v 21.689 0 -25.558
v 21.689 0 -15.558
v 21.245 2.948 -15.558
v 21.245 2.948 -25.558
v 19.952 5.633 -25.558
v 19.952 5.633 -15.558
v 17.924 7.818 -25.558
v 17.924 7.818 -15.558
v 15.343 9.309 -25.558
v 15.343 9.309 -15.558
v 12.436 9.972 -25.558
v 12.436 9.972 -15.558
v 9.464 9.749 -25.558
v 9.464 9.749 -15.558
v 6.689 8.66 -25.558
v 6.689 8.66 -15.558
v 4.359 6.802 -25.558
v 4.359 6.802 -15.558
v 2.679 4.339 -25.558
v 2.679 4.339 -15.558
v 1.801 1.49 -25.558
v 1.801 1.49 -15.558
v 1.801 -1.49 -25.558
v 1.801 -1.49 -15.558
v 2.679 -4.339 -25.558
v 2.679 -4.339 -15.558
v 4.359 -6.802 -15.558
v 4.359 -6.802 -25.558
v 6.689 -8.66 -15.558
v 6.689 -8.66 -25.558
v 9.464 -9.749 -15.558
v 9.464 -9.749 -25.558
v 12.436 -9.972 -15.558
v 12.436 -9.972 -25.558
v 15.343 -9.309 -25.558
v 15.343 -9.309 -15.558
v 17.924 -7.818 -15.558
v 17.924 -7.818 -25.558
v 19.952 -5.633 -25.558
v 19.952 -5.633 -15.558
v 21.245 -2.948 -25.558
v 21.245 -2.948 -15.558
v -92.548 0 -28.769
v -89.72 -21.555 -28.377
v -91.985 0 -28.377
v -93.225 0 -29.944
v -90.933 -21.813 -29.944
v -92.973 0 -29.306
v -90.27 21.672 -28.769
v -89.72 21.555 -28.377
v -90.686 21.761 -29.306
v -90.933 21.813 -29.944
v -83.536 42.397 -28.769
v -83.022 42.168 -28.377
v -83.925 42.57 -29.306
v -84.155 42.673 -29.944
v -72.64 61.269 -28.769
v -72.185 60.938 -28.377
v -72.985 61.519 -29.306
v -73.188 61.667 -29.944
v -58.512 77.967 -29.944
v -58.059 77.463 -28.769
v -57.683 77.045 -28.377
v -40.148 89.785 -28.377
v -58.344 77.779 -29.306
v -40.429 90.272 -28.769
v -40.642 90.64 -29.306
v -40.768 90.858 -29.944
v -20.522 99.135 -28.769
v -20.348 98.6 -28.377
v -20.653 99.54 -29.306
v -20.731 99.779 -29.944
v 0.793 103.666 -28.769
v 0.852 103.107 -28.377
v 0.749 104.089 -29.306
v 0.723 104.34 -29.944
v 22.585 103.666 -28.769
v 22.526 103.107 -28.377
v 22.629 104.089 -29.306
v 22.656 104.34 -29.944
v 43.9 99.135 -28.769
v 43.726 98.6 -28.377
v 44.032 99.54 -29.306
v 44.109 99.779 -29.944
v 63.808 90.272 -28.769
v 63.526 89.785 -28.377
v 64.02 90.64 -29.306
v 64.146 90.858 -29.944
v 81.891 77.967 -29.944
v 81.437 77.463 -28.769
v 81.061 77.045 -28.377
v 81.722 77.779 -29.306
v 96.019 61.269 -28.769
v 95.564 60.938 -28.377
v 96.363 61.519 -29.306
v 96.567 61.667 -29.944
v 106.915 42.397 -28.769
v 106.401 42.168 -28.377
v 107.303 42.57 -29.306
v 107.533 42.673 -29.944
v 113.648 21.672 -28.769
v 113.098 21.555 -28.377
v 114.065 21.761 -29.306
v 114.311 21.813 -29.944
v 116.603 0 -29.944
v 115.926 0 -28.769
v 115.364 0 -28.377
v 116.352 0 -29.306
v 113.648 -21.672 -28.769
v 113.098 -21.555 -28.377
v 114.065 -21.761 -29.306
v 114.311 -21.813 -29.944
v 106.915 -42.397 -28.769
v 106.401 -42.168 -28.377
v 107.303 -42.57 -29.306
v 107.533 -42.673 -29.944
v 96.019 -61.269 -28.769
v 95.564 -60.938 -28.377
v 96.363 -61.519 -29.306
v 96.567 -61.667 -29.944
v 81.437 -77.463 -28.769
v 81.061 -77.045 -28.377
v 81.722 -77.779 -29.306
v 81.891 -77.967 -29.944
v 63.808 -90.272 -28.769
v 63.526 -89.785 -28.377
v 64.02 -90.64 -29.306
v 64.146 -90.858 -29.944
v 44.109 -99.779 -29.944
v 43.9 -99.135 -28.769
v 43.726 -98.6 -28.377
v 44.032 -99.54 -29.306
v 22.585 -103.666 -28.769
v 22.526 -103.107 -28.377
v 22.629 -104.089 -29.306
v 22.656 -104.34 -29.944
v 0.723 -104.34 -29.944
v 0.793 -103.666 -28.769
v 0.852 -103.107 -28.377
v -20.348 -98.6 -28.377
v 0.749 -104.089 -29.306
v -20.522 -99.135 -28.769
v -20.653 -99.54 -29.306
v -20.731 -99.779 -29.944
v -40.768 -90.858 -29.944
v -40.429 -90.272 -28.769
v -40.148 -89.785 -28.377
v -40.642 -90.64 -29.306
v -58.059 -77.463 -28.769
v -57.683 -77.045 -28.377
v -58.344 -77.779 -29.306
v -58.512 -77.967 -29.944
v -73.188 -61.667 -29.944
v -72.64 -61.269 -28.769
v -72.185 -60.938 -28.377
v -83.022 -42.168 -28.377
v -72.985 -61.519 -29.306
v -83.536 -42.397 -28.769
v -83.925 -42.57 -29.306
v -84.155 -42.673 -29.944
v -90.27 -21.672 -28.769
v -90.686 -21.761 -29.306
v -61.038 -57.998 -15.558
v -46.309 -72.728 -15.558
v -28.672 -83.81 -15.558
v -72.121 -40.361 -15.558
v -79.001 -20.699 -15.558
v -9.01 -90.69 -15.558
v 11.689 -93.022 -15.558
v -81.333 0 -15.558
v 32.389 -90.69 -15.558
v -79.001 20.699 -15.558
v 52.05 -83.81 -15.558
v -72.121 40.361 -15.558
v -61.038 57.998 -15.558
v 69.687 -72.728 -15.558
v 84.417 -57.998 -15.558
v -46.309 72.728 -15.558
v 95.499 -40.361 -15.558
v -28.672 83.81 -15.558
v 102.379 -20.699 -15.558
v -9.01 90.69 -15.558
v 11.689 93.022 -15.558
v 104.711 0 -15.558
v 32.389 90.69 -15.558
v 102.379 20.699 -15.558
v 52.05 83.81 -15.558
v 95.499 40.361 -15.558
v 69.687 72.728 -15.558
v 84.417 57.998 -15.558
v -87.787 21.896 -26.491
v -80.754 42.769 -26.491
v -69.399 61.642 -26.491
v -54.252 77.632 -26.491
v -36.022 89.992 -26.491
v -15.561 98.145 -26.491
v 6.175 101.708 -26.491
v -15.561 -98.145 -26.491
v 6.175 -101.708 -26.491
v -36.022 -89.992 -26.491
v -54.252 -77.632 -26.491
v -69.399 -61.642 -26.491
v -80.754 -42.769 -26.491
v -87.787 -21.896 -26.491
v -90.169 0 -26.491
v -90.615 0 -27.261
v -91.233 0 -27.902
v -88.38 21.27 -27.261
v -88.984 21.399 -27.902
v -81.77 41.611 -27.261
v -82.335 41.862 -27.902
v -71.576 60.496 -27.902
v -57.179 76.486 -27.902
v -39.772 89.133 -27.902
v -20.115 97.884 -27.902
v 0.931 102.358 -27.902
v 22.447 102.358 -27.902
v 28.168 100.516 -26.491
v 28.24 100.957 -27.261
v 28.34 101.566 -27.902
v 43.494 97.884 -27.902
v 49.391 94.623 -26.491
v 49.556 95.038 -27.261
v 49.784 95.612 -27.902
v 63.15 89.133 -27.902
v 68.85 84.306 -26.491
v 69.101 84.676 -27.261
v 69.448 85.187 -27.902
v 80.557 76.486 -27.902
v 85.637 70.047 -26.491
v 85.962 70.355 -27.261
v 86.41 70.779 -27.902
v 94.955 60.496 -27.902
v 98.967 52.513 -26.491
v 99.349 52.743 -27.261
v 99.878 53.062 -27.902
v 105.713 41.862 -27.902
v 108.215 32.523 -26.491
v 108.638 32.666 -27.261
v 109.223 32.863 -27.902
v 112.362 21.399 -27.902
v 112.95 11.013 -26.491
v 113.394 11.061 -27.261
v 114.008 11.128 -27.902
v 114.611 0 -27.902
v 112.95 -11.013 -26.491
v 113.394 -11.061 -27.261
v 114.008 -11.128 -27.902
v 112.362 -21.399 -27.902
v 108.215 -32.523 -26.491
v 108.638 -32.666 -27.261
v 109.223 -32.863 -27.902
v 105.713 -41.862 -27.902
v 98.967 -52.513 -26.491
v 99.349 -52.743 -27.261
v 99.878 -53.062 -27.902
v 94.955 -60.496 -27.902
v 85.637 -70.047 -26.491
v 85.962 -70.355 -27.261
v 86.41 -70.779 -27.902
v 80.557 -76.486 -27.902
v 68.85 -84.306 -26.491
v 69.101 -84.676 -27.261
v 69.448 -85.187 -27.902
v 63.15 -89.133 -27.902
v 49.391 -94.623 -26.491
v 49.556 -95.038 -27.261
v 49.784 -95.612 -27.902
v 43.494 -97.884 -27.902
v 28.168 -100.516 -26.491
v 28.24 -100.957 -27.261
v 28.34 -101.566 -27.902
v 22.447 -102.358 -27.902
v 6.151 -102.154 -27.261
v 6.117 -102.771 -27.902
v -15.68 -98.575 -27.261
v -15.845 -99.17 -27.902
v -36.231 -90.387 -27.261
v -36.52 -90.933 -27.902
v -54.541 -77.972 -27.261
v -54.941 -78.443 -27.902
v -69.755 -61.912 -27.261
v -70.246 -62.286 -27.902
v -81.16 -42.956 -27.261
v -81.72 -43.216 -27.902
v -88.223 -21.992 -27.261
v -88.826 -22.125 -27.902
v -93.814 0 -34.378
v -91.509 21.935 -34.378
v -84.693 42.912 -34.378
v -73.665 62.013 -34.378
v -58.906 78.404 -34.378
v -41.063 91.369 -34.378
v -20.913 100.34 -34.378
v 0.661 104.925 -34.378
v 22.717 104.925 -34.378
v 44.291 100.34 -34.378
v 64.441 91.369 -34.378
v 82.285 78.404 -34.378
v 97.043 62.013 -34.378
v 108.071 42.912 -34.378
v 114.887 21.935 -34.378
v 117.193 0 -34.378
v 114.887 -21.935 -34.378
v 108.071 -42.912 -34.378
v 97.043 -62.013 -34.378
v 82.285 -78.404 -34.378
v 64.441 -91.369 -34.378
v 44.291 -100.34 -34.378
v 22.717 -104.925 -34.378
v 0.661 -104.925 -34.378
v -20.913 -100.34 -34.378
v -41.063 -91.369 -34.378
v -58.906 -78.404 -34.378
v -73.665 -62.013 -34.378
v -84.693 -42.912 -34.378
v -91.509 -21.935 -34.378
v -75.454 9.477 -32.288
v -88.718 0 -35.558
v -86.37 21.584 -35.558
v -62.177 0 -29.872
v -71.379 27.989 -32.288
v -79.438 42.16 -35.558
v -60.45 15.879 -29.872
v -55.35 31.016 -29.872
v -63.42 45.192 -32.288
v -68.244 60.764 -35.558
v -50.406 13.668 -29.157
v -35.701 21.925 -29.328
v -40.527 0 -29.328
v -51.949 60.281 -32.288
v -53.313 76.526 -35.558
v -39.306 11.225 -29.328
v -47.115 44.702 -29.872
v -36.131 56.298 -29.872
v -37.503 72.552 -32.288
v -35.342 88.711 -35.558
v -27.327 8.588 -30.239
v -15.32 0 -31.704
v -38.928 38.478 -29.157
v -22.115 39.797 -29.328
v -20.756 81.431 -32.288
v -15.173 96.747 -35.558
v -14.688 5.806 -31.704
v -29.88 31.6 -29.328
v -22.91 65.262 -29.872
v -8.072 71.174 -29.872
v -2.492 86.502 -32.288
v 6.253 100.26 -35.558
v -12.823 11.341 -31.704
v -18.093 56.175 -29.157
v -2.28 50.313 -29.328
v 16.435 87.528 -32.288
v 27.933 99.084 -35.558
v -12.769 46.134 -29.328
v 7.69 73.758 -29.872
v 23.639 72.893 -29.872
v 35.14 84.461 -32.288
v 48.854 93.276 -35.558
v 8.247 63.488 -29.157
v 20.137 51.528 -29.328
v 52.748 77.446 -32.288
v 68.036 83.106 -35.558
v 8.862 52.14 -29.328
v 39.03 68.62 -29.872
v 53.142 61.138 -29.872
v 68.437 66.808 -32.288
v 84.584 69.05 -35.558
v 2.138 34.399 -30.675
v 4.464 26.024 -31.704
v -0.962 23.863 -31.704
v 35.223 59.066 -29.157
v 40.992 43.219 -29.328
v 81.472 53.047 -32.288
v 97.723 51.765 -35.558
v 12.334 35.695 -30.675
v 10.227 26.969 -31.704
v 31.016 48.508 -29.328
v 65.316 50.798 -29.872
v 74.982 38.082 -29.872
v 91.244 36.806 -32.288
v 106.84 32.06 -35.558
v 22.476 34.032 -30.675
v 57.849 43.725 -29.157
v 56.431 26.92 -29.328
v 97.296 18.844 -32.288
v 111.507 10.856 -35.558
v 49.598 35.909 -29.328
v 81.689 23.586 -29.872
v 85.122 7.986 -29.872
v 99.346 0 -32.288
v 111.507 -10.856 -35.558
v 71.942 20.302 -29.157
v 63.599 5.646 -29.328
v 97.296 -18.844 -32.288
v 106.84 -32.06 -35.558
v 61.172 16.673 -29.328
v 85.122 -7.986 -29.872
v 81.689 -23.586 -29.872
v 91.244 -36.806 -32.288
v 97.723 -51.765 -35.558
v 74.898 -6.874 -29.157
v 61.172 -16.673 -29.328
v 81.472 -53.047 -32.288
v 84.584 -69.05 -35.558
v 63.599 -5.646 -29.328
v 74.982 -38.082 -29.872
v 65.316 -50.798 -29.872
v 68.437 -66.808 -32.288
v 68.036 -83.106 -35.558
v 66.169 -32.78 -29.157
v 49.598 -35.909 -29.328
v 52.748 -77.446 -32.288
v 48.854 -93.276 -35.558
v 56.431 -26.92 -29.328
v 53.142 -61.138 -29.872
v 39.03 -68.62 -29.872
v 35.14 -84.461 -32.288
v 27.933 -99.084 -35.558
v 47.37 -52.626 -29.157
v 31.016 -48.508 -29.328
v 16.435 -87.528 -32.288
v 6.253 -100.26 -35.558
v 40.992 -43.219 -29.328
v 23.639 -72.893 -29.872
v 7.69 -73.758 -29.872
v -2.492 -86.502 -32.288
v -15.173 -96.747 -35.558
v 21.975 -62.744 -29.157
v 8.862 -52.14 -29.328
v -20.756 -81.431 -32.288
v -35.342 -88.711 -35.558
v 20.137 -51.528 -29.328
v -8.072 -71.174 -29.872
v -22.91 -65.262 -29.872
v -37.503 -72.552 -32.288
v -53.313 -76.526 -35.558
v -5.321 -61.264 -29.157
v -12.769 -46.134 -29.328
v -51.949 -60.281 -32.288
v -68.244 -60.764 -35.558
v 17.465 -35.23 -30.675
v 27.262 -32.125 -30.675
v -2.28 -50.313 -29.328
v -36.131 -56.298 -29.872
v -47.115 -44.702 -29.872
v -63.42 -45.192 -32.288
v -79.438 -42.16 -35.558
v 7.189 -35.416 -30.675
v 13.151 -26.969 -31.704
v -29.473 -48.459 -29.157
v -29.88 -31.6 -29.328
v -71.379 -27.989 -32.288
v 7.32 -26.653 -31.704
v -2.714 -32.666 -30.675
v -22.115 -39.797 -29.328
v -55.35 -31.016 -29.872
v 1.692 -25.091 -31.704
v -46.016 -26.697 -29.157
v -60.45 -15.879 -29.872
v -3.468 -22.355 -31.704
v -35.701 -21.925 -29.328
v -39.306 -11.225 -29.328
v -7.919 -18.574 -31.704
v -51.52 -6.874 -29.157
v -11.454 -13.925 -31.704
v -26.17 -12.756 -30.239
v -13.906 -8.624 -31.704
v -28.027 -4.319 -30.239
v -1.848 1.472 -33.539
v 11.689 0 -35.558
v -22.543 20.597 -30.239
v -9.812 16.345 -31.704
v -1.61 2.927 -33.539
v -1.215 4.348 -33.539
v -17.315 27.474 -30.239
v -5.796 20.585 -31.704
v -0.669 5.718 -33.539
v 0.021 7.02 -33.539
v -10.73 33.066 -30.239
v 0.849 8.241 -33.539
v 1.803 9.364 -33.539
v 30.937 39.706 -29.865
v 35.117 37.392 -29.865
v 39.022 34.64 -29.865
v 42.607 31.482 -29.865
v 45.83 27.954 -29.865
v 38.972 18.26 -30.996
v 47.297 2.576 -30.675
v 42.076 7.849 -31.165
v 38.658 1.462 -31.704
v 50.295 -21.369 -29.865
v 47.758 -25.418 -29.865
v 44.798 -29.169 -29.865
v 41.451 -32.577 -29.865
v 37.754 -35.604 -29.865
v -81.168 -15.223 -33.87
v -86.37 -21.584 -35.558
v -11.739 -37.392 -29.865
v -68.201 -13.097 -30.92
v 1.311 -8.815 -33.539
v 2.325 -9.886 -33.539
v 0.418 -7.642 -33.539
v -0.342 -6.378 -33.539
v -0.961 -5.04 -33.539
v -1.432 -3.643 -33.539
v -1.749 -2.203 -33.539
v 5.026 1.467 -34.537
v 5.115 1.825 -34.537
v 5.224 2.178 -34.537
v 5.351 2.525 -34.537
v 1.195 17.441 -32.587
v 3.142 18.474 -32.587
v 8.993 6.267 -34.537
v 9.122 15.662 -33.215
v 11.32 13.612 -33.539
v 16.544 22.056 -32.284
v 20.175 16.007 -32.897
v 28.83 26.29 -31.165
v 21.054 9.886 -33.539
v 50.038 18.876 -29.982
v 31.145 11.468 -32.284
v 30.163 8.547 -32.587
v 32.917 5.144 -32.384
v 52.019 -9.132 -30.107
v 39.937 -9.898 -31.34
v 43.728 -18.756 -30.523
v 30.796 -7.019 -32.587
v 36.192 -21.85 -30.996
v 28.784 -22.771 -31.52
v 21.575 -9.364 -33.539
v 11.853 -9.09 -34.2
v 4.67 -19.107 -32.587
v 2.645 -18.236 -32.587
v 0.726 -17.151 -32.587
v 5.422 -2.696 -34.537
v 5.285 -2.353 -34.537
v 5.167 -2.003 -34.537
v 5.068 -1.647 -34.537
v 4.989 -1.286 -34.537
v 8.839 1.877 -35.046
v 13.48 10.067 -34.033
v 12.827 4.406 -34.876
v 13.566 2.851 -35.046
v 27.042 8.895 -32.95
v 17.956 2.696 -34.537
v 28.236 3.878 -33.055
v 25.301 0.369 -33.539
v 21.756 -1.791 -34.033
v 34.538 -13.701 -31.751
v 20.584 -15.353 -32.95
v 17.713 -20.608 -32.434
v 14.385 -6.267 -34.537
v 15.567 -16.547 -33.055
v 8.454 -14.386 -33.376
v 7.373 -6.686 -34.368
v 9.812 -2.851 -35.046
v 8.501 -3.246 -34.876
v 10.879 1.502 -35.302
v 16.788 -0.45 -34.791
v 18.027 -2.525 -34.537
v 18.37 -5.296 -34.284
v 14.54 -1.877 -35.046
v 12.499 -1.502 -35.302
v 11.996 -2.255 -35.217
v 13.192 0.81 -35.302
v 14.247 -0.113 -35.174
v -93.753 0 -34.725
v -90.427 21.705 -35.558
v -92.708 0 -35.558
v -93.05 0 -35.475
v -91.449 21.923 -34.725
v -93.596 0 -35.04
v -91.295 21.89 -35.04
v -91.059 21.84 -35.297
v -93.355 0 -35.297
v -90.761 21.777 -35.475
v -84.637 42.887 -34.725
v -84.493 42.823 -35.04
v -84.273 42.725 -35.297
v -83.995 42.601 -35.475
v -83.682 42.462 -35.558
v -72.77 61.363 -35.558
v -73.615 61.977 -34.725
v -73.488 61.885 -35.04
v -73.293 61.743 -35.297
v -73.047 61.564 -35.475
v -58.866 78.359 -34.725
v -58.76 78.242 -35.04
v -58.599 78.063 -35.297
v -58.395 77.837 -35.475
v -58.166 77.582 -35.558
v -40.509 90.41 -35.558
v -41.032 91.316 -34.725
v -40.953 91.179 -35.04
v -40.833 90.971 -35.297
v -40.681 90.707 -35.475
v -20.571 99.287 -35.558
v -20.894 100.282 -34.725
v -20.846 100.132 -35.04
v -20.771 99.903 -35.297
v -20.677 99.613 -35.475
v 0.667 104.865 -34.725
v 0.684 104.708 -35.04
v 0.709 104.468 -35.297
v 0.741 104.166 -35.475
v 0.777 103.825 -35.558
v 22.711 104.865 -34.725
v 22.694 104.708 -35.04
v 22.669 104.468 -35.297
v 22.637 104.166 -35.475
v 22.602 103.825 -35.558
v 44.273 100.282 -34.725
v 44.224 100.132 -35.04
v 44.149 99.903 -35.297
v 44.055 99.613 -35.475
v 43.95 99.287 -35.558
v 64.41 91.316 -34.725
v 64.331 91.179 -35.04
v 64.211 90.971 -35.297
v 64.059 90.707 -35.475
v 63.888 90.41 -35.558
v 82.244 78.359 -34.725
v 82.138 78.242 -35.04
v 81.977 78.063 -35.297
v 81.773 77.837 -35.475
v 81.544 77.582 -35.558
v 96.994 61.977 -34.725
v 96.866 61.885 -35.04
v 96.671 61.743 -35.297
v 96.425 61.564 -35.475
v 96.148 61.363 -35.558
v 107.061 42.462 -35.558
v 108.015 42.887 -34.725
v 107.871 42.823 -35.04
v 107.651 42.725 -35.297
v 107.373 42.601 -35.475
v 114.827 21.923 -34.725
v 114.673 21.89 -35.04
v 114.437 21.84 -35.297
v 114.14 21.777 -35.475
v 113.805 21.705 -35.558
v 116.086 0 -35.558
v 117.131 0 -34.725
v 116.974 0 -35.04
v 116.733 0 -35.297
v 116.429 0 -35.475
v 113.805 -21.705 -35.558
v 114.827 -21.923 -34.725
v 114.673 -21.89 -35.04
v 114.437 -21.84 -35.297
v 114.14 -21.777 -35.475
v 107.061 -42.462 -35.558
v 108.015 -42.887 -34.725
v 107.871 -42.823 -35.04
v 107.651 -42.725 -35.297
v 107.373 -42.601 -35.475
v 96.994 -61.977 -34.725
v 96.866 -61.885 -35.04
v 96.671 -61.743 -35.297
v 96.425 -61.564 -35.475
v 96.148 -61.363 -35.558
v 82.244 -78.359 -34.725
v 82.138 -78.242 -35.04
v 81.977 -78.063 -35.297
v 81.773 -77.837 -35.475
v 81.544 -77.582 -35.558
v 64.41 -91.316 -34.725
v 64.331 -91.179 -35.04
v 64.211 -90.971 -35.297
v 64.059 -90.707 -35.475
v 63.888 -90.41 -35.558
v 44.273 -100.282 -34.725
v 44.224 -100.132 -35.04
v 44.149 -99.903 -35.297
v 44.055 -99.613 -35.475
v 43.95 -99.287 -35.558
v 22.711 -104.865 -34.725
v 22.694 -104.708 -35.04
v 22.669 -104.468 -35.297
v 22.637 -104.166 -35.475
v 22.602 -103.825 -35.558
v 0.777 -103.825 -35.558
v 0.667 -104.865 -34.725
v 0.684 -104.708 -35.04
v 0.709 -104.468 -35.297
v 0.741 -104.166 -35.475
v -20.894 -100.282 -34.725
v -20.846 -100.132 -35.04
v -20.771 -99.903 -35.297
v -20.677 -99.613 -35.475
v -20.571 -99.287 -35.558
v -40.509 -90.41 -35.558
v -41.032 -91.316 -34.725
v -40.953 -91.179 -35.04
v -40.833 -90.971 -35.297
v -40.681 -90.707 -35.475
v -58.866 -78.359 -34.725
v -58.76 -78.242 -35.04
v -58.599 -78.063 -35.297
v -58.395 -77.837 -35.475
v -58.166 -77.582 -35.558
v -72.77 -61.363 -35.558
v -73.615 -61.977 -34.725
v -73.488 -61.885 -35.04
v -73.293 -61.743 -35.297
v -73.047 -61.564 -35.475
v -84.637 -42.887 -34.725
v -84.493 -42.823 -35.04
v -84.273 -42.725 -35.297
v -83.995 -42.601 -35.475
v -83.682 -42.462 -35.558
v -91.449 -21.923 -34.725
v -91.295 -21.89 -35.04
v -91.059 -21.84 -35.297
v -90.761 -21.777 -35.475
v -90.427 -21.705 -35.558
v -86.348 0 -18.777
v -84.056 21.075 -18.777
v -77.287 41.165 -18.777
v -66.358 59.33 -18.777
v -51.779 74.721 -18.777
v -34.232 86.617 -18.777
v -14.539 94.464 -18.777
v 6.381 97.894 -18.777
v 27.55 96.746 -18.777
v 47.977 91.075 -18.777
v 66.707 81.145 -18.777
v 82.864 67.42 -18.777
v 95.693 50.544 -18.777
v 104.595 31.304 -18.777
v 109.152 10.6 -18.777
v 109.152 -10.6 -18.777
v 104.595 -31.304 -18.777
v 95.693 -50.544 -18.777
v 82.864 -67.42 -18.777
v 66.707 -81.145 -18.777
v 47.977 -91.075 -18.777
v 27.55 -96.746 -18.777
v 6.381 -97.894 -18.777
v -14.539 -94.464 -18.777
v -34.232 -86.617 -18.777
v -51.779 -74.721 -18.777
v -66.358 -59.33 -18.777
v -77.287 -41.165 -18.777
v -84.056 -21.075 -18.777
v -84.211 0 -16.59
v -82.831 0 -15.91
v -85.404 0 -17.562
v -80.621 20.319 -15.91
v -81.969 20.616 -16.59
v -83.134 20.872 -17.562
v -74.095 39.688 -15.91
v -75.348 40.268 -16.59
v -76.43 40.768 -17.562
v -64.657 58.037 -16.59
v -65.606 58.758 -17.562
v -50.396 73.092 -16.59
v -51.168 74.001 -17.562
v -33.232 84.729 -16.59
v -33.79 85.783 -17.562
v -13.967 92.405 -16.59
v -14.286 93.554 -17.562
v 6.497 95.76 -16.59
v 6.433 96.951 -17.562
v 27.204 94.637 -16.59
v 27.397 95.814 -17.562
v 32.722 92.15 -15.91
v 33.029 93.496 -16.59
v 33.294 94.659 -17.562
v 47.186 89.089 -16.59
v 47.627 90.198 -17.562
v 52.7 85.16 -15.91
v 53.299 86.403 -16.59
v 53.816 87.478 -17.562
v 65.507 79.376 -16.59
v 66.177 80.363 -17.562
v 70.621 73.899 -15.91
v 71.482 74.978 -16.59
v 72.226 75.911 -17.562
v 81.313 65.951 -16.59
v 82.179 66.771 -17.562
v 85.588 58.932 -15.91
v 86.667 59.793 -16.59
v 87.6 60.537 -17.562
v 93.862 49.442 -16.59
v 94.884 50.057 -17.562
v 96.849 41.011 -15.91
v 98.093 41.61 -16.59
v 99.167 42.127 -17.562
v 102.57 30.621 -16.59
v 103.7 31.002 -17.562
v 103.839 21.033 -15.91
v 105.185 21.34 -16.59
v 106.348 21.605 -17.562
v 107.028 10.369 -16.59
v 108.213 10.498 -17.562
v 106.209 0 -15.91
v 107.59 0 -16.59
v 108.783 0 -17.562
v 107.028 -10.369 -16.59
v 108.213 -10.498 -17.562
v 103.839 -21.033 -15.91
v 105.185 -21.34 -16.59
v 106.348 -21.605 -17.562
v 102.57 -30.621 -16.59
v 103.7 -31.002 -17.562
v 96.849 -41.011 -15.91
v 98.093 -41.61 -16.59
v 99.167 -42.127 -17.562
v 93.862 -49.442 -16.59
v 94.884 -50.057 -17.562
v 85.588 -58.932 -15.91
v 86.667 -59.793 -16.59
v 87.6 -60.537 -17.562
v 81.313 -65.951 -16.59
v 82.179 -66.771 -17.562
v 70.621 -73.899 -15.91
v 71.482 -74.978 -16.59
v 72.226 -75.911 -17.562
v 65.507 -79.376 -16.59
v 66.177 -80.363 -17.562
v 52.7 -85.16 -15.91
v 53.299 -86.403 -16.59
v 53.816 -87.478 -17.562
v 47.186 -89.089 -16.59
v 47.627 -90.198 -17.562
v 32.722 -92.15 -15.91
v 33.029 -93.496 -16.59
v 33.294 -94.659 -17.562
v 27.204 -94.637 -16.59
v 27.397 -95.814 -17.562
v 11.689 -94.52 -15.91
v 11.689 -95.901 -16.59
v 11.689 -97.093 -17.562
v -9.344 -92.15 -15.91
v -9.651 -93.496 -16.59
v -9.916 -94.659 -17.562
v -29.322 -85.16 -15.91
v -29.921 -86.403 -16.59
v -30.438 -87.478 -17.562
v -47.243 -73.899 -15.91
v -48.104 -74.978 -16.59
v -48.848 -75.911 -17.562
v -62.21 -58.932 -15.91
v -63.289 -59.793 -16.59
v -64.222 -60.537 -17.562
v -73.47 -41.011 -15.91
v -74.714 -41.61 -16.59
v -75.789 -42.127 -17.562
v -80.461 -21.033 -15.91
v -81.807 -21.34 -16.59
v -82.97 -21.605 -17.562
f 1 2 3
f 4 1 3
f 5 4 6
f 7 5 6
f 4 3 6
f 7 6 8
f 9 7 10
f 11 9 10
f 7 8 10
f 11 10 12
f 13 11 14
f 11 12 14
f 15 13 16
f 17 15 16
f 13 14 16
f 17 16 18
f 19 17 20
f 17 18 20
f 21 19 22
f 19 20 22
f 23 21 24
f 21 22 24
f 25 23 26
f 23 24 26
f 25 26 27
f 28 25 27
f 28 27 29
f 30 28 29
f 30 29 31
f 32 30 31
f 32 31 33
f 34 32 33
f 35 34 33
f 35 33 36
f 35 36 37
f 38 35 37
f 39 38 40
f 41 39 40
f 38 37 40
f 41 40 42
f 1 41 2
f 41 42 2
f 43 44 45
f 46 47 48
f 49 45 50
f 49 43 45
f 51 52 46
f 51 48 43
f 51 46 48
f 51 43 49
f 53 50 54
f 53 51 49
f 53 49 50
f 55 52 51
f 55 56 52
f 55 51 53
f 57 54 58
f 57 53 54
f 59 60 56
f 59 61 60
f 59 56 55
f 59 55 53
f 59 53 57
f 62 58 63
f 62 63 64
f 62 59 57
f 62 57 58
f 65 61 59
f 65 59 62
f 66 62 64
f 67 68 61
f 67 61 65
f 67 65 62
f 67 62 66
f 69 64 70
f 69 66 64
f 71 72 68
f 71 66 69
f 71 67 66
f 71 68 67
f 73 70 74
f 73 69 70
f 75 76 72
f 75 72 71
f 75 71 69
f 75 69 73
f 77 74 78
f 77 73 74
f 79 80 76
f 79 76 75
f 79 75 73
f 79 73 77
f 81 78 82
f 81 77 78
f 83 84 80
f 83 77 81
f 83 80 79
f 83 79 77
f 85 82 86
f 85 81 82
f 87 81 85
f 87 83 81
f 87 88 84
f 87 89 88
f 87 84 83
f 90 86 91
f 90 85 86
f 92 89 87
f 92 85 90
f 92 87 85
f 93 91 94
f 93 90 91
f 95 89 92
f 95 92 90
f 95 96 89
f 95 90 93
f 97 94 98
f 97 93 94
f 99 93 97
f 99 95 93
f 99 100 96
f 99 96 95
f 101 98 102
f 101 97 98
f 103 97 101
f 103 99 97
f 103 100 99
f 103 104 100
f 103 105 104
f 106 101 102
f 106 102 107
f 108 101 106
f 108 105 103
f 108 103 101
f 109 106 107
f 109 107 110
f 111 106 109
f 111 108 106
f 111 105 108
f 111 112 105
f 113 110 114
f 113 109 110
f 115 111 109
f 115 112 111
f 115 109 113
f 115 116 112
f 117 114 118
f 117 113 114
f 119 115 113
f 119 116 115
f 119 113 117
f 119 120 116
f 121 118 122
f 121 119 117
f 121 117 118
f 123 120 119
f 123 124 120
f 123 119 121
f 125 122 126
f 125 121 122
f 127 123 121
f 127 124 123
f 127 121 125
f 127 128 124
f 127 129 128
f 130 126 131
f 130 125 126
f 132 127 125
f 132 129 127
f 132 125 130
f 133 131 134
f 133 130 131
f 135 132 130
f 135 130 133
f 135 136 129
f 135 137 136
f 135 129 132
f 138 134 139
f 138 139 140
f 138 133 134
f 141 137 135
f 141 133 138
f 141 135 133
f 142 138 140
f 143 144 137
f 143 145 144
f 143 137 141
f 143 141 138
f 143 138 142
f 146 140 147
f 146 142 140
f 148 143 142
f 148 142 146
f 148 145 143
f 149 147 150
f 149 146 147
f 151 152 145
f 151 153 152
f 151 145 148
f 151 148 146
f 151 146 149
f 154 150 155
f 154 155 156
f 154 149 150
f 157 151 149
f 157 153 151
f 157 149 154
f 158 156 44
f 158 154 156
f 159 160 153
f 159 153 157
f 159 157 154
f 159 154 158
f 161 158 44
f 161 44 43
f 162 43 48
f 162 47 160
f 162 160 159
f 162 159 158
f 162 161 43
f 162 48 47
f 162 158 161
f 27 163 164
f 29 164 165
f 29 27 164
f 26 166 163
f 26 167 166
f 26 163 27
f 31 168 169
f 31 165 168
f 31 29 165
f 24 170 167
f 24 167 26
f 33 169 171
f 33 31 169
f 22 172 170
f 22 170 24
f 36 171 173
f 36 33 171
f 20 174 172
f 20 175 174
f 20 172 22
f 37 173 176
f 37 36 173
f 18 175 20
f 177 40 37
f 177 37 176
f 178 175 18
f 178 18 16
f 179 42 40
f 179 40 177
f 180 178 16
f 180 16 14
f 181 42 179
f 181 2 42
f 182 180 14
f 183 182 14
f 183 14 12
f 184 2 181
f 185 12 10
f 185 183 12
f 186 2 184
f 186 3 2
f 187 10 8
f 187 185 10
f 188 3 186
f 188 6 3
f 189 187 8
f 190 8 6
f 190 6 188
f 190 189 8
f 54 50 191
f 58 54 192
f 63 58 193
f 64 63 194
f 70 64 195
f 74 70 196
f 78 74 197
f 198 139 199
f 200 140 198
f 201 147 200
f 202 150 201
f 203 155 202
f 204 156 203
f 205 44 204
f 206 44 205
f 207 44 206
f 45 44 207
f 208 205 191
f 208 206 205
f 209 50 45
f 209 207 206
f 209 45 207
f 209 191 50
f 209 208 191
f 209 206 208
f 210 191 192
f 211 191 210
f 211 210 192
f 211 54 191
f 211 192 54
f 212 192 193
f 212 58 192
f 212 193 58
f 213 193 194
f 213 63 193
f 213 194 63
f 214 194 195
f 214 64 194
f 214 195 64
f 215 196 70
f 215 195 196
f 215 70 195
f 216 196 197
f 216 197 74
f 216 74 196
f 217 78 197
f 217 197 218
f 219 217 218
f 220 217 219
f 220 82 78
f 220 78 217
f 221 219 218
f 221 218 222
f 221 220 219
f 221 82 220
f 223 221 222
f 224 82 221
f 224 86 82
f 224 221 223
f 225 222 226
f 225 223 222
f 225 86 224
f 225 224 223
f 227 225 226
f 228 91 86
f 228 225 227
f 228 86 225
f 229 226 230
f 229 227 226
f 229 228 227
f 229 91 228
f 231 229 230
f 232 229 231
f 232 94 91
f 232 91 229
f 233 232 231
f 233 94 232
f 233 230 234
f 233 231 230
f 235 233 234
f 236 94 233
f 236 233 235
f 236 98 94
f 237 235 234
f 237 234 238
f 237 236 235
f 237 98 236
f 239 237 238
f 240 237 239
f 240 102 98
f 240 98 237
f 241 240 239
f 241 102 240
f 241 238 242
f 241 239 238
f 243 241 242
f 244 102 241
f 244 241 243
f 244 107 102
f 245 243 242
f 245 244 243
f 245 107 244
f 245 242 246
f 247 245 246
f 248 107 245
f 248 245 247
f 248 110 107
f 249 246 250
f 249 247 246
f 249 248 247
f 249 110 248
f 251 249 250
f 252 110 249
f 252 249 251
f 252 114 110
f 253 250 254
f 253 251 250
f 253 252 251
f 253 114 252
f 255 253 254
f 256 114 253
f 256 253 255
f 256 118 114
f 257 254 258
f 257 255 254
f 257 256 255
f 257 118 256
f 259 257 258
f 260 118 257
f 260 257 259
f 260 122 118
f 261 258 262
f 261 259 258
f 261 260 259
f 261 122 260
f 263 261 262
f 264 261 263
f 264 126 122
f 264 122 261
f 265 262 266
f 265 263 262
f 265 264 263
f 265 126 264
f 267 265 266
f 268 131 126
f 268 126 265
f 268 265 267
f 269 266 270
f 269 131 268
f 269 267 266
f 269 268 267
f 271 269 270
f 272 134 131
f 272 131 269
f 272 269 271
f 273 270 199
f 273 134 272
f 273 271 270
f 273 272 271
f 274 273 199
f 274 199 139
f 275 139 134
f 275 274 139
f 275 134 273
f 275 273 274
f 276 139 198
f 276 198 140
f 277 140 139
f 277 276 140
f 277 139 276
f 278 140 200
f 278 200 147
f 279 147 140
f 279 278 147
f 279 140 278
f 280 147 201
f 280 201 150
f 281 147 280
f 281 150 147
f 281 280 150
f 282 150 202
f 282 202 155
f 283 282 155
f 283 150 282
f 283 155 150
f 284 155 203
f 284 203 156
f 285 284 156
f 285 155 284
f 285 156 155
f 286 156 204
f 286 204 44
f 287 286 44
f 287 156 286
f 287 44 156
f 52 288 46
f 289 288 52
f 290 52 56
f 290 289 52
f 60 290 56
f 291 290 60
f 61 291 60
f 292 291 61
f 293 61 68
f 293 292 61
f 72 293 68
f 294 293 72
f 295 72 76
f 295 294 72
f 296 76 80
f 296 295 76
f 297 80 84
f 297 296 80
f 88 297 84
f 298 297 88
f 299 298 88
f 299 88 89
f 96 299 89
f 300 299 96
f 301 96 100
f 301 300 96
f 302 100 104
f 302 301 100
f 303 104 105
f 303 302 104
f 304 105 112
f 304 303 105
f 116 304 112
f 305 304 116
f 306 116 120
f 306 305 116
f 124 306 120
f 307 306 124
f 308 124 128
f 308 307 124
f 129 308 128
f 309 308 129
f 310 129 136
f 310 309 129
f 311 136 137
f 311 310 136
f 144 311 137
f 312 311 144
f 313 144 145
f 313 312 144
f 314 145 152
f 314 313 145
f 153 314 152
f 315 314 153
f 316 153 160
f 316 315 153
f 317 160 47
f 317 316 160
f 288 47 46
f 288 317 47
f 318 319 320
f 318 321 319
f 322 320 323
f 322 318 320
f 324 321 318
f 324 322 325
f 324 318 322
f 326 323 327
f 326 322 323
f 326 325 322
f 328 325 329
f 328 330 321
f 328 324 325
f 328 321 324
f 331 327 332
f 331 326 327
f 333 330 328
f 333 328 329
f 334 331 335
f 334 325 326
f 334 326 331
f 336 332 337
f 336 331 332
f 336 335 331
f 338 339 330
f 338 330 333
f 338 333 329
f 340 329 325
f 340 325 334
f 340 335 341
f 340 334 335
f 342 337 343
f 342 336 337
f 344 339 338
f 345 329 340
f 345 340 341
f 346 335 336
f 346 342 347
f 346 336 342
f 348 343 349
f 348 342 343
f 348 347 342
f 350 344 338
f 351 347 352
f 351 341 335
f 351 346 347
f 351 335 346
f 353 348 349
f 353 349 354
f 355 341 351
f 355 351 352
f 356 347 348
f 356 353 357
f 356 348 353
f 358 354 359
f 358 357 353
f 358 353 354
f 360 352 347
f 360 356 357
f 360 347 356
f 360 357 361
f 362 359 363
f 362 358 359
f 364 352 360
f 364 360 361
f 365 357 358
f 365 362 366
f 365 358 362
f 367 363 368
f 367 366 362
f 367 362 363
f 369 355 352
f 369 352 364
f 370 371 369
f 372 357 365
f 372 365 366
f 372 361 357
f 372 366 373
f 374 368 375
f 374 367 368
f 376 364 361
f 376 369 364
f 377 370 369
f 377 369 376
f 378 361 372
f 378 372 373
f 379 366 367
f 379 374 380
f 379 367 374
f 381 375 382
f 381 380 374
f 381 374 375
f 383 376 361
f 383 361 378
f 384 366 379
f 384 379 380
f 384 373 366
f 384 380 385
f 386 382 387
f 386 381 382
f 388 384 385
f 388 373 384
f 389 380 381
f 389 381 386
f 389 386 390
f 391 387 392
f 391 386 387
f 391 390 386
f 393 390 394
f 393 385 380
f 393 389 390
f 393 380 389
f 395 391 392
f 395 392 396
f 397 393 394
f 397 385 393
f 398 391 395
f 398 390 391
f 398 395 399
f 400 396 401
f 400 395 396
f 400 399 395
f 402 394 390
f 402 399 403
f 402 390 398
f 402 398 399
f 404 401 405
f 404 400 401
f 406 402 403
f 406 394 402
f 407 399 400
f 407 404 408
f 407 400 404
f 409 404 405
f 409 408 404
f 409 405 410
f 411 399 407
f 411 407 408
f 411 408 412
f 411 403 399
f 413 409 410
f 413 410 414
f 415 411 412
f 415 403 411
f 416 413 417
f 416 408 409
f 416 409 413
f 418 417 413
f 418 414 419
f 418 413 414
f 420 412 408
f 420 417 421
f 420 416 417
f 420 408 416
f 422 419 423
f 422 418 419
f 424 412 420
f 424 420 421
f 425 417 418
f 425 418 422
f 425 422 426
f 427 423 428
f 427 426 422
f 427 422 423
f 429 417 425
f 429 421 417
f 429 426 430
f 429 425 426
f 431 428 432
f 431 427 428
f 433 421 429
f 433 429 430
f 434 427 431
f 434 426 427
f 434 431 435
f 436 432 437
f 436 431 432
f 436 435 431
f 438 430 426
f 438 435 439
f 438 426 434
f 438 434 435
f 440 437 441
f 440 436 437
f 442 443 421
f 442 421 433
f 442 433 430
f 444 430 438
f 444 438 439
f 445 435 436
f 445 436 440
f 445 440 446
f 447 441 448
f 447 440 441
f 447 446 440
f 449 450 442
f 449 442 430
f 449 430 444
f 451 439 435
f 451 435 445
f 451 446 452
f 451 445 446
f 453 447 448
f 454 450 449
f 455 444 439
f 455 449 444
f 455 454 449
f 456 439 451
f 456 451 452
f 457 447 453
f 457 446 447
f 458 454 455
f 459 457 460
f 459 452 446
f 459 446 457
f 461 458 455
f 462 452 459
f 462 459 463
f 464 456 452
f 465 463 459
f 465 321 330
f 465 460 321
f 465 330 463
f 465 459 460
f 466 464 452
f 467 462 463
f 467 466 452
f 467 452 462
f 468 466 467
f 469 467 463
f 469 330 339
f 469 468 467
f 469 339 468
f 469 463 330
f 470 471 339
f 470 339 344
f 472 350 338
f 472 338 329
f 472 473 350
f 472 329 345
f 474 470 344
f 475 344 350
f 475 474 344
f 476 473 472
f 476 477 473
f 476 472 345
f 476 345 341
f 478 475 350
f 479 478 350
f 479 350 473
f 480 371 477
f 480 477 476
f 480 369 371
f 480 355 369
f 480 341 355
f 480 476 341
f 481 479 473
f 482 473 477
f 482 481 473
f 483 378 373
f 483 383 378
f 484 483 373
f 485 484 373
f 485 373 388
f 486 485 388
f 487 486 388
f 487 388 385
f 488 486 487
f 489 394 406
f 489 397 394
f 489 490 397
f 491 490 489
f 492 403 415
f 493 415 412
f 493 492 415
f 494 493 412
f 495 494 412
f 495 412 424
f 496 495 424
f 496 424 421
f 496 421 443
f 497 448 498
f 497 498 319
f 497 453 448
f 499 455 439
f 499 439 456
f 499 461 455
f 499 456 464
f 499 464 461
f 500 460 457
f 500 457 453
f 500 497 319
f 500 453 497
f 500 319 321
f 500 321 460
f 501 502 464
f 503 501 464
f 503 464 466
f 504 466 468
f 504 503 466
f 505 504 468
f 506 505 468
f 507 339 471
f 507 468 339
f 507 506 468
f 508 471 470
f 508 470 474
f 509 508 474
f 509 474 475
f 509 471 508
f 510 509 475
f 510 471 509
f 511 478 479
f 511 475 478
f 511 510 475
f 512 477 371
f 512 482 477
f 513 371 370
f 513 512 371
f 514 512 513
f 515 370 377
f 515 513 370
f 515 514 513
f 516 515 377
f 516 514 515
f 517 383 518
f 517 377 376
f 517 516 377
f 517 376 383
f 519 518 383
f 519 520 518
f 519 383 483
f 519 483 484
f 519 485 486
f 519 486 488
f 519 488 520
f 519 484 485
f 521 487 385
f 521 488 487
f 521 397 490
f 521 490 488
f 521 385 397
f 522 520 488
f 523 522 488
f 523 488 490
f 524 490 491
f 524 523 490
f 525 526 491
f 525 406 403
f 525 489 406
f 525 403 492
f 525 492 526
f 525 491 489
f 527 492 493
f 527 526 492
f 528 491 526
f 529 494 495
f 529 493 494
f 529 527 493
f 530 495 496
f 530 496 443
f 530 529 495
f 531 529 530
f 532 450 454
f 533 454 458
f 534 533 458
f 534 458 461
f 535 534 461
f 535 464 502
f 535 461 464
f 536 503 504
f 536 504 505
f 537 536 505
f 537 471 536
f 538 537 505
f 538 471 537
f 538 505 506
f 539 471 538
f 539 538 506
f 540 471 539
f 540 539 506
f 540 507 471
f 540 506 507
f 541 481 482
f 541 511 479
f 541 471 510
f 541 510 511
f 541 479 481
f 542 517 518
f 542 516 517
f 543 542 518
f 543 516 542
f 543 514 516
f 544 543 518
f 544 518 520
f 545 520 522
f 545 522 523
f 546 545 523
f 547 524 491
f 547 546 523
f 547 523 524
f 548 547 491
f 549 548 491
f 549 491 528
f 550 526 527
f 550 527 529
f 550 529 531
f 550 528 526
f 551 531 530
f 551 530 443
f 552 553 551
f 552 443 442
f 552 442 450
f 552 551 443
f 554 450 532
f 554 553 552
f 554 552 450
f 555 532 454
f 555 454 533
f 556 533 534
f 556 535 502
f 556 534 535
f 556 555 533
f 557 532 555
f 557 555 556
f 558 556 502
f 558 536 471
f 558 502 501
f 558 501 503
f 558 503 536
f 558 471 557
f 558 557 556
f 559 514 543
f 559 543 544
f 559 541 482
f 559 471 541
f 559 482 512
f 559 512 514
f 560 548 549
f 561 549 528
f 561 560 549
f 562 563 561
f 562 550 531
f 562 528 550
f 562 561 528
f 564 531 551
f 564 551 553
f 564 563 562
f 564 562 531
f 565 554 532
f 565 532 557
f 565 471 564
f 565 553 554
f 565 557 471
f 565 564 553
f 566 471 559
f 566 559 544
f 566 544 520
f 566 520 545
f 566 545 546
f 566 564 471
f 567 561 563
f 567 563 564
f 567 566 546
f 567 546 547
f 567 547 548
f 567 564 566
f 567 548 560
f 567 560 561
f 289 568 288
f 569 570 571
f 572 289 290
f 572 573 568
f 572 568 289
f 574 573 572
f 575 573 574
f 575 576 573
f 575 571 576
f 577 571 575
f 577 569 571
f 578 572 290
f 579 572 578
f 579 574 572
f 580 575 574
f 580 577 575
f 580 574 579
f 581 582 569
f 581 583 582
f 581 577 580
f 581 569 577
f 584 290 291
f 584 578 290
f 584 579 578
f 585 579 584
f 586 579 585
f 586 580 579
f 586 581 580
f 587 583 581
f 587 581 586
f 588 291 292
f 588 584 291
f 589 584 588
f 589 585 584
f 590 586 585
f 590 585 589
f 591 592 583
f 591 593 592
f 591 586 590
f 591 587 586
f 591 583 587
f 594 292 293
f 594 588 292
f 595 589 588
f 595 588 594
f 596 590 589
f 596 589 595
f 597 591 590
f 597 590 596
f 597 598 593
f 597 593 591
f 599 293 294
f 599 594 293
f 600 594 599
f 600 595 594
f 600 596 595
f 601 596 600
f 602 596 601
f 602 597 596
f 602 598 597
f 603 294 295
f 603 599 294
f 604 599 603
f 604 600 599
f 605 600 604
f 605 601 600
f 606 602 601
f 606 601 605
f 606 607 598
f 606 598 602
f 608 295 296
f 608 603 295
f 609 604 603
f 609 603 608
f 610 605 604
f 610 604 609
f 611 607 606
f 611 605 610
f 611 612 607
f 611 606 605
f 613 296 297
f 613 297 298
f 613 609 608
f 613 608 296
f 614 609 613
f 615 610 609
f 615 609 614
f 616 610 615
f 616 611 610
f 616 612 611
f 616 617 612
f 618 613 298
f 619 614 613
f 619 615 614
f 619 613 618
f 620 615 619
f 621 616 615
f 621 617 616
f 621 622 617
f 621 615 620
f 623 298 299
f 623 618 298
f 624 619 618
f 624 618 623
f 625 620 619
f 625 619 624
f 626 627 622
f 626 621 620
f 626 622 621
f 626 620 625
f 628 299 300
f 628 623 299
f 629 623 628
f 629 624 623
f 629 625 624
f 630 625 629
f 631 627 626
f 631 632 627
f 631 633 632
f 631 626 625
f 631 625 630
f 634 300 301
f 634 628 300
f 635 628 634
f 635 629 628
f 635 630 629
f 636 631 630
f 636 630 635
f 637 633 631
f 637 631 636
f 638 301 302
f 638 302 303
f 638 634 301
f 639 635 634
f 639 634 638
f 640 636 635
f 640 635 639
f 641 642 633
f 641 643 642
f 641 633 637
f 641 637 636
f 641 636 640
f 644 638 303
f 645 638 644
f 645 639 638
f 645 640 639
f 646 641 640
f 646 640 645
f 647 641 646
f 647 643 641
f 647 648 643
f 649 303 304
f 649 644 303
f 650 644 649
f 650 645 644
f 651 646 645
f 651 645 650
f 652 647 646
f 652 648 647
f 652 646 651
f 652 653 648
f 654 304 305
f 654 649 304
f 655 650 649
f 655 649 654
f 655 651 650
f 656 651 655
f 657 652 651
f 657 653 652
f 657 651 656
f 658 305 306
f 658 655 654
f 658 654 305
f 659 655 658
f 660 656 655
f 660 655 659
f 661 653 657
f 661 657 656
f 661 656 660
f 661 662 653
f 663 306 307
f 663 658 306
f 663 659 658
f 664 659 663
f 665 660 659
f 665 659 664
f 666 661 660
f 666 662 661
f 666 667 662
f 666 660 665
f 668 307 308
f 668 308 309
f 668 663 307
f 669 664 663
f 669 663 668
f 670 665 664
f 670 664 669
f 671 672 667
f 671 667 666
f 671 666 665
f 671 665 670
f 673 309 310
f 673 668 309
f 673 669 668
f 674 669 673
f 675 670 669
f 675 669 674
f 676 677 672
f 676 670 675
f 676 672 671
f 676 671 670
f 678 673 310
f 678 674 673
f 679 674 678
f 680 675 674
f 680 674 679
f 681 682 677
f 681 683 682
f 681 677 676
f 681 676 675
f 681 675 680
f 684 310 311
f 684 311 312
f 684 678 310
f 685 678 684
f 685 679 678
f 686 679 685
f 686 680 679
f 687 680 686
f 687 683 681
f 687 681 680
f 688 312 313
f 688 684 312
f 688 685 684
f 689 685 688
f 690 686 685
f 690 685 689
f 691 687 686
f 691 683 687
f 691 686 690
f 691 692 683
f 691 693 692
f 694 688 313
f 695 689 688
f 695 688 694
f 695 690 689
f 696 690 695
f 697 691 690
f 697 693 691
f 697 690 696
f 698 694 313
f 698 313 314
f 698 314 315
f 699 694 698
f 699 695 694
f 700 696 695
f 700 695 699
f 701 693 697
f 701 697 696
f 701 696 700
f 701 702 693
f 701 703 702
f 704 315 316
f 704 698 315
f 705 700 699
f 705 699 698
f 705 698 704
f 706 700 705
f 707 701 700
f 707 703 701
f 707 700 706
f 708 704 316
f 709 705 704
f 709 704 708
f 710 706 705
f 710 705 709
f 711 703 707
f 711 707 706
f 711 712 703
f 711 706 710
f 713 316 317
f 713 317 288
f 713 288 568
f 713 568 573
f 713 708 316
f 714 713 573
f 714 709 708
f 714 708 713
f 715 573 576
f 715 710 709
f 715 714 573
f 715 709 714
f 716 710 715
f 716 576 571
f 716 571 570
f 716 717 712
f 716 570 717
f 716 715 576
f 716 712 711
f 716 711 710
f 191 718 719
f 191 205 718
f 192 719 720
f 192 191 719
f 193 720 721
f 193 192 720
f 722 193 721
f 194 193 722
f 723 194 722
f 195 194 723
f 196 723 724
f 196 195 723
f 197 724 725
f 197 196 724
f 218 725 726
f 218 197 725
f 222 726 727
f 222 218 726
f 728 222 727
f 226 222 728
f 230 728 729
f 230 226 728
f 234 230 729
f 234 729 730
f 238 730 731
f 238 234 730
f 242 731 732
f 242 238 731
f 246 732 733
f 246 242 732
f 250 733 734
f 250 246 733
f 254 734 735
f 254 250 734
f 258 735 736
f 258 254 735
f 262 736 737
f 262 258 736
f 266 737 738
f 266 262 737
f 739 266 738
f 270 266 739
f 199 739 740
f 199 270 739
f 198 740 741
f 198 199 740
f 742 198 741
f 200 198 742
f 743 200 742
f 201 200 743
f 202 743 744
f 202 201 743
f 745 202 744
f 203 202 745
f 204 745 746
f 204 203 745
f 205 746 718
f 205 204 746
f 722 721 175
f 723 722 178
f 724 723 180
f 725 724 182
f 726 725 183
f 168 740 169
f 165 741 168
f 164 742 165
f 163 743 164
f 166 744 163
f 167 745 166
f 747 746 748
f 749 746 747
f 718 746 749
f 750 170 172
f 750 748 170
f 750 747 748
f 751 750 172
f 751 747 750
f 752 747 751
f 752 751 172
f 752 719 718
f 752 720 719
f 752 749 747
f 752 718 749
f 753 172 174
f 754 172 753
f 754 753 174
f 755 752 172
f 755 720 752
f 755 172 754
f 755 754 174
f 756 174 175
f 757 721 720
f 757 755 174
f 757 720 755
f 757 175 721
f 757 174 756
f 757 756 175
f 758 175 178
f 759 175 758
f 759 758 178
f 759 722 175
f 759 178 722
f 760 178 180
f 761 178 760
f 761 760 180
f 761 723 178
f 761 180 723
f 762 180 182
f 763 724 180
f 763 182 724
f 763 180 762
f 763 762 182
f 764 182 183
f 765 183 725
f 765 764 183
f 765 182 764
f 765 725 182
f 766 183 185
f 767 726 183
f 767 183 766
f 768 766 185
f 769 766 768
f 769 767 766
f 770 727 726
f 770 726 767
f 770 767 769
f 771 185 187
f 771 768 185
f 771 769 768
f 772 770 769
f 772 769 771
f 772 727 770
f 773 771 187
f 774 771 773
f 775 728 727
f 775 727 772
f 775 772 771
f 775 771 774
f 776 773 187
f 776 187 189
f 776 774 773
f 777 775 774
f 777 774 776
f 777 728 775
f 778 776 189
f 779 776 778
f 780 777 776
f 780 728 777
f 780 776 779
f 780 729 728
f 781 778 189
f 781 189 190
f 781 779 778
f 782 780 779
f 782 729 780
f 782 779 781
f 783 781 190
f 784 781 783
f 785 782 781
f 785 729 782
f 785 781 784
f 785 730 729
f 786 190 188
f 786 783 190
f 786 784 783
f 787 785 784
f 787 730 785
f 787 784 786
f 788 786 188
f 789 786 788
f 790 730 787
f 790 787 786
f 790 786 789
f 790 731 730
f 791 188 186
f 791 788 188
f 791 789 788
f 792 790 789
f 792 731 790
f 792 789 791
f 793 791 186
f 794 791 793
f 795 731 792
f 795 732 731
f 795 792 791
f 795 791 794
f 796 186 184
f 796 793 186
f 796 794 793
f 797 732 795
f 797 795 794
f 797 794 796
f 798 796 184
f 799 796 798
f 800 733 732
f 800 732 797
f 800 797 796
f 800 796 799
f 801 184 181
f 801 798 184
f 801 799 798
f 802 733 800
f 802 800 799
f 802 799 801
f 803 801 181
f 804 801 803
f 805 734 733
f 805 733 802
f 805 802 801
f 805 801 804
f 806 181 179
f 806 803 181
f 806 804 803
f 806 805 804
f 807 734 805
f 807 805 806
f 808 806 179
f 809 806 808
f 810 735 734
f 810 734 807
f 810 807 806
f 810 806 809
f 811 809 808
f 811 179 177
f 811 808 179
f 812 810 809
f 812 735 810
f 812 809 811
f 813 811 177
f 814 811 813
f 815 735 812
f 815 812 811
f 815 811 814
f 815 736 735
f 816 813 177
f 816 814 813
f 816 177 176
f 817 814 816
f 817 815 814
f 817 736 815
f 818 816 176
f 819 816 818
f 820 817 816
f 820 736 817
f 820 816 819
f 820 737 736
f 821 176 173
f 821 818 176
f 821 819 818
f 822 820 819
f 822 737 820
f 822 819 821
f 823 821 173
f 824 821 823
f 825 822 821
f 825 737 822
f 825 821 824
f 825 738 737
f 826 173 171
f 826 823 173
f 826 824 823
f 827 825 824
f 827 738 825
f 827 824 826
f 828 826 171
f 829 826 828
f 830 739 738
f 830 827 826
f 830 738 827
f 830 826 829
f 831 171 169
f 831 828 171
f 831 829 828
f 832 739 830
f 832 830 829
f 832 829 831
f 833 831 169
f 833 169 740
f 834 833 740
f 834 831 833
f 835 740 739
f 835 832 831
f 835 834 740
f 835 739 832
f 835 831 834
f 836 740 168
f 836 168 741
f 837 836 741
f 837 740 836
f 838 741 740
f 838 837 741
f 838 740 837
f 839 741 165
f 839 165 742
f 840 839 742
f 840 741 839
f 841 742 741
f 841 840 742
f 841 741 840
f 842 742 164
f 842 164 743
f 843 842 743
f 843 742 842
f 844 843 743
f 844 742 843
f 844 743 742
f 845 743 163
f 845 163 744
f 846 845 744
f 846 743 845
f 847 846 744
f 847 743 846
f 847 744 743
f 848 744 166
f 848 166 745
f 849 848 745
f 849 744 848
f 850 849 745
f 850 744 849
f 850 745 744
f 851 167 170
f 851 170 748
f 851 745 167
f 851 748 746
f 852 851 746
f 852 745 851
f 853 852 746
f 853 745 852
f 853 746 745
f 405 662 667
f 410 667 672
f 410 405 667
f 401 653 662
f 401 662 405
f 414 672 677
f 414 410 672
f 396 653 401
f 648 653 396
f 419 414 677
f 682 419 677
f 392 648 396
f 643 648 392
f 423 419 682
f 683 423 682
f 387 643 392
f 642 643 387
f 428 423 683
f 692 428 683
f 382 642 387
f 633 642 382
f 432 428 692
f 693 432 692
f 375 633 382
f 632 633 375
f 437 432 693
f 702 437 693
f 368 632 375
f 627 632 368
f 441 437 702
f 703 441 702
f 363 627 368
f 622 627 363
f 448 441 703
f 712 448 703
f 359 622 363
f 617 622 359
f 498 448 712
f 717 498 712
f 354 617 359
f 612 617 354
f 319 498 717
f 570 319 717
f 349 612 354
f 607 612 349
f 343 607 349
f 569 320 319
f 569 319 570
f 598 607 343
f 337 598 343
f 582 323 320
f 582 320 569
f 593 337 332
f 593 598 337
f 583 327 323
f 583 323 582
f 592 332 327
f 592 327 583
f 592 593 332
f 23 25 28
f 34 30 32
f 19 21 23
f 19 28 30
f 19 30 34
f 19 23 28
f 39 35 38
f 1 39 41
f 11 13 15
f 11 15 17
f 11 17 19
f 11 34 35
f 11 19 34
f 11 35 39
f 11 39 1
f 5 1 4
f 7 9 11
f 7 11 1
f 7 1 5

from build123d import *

# Parameters (mm, degrees)
F2_R     = 10
F3_DEPTH = 10


with BuildPart() as f1:
    # F0 (on Front) → F1 (revolve)
    with BuildSketch(Plane.XZ):
        with BuildLine():
            Line((11.689145118, -35.5582595617), (11.689145118, -15.5582595617))
            Line((11.689145118, -15.5582595617), (-81.3329861734, -15.5582595617))
            ThreePointArc((-81.3329861734, -15.5582595617), (-84.211444681, -16.5897334558), (-86.3484293338, -18.7766852998))
            Line((-86.3484293338, -18.7766852998), (-90.1685365005, -26.4905757821))
            ThreePointArc((-90.1685365005, -26.4905757821), (-90.9045353216, -27.6000474155), (-91.9853784144, -28.3774789423))
            ThreePointArc((-91.9853784144, -28.3774789423), (-92.7804477917, -29.0220125857), (-93.2252020866, -29.9438328227))
            Line((-93.2252020866, -29.9438328227), (-93.8142386214, -34.3779310194))
            ThreePointArc((-93.8142386214, -34.3779310194), (-93.4843724367, -35.1773967677), (-92.7079056218, -35.5582595617))
            Line((-92.7079056218, -35.5582595617), (-88.7176468968, -35.5582595617))
            add(Edge.make_bspline(
                [(-88.7176468968, -35.5582595617), (-78.0986901929, -32.6772750403), (-52.9449616904, -25.852922659), (-11.9812376311, -32.0039590454), (11.689145118, -35.5582595617)],
                knots=[0, 0, 0, 0, 0.4221623328, 1, 1, 1, 1], degree=3))
        make_face()
    revolve(axis=Axis((11.689145118, 0, 7.002228424), (0, 0, -1)))

    # F2 (on face) → F3 (cut)
    with BuildSketch(Plane.XY.offset(-15.5582595617)):
        with Locations((11.689145118, 0)):
            Circle(F2_R)
    extrude(amount=-F3_DEPTH, mode=Mode.SUBTRACT)


solid = f1.part
